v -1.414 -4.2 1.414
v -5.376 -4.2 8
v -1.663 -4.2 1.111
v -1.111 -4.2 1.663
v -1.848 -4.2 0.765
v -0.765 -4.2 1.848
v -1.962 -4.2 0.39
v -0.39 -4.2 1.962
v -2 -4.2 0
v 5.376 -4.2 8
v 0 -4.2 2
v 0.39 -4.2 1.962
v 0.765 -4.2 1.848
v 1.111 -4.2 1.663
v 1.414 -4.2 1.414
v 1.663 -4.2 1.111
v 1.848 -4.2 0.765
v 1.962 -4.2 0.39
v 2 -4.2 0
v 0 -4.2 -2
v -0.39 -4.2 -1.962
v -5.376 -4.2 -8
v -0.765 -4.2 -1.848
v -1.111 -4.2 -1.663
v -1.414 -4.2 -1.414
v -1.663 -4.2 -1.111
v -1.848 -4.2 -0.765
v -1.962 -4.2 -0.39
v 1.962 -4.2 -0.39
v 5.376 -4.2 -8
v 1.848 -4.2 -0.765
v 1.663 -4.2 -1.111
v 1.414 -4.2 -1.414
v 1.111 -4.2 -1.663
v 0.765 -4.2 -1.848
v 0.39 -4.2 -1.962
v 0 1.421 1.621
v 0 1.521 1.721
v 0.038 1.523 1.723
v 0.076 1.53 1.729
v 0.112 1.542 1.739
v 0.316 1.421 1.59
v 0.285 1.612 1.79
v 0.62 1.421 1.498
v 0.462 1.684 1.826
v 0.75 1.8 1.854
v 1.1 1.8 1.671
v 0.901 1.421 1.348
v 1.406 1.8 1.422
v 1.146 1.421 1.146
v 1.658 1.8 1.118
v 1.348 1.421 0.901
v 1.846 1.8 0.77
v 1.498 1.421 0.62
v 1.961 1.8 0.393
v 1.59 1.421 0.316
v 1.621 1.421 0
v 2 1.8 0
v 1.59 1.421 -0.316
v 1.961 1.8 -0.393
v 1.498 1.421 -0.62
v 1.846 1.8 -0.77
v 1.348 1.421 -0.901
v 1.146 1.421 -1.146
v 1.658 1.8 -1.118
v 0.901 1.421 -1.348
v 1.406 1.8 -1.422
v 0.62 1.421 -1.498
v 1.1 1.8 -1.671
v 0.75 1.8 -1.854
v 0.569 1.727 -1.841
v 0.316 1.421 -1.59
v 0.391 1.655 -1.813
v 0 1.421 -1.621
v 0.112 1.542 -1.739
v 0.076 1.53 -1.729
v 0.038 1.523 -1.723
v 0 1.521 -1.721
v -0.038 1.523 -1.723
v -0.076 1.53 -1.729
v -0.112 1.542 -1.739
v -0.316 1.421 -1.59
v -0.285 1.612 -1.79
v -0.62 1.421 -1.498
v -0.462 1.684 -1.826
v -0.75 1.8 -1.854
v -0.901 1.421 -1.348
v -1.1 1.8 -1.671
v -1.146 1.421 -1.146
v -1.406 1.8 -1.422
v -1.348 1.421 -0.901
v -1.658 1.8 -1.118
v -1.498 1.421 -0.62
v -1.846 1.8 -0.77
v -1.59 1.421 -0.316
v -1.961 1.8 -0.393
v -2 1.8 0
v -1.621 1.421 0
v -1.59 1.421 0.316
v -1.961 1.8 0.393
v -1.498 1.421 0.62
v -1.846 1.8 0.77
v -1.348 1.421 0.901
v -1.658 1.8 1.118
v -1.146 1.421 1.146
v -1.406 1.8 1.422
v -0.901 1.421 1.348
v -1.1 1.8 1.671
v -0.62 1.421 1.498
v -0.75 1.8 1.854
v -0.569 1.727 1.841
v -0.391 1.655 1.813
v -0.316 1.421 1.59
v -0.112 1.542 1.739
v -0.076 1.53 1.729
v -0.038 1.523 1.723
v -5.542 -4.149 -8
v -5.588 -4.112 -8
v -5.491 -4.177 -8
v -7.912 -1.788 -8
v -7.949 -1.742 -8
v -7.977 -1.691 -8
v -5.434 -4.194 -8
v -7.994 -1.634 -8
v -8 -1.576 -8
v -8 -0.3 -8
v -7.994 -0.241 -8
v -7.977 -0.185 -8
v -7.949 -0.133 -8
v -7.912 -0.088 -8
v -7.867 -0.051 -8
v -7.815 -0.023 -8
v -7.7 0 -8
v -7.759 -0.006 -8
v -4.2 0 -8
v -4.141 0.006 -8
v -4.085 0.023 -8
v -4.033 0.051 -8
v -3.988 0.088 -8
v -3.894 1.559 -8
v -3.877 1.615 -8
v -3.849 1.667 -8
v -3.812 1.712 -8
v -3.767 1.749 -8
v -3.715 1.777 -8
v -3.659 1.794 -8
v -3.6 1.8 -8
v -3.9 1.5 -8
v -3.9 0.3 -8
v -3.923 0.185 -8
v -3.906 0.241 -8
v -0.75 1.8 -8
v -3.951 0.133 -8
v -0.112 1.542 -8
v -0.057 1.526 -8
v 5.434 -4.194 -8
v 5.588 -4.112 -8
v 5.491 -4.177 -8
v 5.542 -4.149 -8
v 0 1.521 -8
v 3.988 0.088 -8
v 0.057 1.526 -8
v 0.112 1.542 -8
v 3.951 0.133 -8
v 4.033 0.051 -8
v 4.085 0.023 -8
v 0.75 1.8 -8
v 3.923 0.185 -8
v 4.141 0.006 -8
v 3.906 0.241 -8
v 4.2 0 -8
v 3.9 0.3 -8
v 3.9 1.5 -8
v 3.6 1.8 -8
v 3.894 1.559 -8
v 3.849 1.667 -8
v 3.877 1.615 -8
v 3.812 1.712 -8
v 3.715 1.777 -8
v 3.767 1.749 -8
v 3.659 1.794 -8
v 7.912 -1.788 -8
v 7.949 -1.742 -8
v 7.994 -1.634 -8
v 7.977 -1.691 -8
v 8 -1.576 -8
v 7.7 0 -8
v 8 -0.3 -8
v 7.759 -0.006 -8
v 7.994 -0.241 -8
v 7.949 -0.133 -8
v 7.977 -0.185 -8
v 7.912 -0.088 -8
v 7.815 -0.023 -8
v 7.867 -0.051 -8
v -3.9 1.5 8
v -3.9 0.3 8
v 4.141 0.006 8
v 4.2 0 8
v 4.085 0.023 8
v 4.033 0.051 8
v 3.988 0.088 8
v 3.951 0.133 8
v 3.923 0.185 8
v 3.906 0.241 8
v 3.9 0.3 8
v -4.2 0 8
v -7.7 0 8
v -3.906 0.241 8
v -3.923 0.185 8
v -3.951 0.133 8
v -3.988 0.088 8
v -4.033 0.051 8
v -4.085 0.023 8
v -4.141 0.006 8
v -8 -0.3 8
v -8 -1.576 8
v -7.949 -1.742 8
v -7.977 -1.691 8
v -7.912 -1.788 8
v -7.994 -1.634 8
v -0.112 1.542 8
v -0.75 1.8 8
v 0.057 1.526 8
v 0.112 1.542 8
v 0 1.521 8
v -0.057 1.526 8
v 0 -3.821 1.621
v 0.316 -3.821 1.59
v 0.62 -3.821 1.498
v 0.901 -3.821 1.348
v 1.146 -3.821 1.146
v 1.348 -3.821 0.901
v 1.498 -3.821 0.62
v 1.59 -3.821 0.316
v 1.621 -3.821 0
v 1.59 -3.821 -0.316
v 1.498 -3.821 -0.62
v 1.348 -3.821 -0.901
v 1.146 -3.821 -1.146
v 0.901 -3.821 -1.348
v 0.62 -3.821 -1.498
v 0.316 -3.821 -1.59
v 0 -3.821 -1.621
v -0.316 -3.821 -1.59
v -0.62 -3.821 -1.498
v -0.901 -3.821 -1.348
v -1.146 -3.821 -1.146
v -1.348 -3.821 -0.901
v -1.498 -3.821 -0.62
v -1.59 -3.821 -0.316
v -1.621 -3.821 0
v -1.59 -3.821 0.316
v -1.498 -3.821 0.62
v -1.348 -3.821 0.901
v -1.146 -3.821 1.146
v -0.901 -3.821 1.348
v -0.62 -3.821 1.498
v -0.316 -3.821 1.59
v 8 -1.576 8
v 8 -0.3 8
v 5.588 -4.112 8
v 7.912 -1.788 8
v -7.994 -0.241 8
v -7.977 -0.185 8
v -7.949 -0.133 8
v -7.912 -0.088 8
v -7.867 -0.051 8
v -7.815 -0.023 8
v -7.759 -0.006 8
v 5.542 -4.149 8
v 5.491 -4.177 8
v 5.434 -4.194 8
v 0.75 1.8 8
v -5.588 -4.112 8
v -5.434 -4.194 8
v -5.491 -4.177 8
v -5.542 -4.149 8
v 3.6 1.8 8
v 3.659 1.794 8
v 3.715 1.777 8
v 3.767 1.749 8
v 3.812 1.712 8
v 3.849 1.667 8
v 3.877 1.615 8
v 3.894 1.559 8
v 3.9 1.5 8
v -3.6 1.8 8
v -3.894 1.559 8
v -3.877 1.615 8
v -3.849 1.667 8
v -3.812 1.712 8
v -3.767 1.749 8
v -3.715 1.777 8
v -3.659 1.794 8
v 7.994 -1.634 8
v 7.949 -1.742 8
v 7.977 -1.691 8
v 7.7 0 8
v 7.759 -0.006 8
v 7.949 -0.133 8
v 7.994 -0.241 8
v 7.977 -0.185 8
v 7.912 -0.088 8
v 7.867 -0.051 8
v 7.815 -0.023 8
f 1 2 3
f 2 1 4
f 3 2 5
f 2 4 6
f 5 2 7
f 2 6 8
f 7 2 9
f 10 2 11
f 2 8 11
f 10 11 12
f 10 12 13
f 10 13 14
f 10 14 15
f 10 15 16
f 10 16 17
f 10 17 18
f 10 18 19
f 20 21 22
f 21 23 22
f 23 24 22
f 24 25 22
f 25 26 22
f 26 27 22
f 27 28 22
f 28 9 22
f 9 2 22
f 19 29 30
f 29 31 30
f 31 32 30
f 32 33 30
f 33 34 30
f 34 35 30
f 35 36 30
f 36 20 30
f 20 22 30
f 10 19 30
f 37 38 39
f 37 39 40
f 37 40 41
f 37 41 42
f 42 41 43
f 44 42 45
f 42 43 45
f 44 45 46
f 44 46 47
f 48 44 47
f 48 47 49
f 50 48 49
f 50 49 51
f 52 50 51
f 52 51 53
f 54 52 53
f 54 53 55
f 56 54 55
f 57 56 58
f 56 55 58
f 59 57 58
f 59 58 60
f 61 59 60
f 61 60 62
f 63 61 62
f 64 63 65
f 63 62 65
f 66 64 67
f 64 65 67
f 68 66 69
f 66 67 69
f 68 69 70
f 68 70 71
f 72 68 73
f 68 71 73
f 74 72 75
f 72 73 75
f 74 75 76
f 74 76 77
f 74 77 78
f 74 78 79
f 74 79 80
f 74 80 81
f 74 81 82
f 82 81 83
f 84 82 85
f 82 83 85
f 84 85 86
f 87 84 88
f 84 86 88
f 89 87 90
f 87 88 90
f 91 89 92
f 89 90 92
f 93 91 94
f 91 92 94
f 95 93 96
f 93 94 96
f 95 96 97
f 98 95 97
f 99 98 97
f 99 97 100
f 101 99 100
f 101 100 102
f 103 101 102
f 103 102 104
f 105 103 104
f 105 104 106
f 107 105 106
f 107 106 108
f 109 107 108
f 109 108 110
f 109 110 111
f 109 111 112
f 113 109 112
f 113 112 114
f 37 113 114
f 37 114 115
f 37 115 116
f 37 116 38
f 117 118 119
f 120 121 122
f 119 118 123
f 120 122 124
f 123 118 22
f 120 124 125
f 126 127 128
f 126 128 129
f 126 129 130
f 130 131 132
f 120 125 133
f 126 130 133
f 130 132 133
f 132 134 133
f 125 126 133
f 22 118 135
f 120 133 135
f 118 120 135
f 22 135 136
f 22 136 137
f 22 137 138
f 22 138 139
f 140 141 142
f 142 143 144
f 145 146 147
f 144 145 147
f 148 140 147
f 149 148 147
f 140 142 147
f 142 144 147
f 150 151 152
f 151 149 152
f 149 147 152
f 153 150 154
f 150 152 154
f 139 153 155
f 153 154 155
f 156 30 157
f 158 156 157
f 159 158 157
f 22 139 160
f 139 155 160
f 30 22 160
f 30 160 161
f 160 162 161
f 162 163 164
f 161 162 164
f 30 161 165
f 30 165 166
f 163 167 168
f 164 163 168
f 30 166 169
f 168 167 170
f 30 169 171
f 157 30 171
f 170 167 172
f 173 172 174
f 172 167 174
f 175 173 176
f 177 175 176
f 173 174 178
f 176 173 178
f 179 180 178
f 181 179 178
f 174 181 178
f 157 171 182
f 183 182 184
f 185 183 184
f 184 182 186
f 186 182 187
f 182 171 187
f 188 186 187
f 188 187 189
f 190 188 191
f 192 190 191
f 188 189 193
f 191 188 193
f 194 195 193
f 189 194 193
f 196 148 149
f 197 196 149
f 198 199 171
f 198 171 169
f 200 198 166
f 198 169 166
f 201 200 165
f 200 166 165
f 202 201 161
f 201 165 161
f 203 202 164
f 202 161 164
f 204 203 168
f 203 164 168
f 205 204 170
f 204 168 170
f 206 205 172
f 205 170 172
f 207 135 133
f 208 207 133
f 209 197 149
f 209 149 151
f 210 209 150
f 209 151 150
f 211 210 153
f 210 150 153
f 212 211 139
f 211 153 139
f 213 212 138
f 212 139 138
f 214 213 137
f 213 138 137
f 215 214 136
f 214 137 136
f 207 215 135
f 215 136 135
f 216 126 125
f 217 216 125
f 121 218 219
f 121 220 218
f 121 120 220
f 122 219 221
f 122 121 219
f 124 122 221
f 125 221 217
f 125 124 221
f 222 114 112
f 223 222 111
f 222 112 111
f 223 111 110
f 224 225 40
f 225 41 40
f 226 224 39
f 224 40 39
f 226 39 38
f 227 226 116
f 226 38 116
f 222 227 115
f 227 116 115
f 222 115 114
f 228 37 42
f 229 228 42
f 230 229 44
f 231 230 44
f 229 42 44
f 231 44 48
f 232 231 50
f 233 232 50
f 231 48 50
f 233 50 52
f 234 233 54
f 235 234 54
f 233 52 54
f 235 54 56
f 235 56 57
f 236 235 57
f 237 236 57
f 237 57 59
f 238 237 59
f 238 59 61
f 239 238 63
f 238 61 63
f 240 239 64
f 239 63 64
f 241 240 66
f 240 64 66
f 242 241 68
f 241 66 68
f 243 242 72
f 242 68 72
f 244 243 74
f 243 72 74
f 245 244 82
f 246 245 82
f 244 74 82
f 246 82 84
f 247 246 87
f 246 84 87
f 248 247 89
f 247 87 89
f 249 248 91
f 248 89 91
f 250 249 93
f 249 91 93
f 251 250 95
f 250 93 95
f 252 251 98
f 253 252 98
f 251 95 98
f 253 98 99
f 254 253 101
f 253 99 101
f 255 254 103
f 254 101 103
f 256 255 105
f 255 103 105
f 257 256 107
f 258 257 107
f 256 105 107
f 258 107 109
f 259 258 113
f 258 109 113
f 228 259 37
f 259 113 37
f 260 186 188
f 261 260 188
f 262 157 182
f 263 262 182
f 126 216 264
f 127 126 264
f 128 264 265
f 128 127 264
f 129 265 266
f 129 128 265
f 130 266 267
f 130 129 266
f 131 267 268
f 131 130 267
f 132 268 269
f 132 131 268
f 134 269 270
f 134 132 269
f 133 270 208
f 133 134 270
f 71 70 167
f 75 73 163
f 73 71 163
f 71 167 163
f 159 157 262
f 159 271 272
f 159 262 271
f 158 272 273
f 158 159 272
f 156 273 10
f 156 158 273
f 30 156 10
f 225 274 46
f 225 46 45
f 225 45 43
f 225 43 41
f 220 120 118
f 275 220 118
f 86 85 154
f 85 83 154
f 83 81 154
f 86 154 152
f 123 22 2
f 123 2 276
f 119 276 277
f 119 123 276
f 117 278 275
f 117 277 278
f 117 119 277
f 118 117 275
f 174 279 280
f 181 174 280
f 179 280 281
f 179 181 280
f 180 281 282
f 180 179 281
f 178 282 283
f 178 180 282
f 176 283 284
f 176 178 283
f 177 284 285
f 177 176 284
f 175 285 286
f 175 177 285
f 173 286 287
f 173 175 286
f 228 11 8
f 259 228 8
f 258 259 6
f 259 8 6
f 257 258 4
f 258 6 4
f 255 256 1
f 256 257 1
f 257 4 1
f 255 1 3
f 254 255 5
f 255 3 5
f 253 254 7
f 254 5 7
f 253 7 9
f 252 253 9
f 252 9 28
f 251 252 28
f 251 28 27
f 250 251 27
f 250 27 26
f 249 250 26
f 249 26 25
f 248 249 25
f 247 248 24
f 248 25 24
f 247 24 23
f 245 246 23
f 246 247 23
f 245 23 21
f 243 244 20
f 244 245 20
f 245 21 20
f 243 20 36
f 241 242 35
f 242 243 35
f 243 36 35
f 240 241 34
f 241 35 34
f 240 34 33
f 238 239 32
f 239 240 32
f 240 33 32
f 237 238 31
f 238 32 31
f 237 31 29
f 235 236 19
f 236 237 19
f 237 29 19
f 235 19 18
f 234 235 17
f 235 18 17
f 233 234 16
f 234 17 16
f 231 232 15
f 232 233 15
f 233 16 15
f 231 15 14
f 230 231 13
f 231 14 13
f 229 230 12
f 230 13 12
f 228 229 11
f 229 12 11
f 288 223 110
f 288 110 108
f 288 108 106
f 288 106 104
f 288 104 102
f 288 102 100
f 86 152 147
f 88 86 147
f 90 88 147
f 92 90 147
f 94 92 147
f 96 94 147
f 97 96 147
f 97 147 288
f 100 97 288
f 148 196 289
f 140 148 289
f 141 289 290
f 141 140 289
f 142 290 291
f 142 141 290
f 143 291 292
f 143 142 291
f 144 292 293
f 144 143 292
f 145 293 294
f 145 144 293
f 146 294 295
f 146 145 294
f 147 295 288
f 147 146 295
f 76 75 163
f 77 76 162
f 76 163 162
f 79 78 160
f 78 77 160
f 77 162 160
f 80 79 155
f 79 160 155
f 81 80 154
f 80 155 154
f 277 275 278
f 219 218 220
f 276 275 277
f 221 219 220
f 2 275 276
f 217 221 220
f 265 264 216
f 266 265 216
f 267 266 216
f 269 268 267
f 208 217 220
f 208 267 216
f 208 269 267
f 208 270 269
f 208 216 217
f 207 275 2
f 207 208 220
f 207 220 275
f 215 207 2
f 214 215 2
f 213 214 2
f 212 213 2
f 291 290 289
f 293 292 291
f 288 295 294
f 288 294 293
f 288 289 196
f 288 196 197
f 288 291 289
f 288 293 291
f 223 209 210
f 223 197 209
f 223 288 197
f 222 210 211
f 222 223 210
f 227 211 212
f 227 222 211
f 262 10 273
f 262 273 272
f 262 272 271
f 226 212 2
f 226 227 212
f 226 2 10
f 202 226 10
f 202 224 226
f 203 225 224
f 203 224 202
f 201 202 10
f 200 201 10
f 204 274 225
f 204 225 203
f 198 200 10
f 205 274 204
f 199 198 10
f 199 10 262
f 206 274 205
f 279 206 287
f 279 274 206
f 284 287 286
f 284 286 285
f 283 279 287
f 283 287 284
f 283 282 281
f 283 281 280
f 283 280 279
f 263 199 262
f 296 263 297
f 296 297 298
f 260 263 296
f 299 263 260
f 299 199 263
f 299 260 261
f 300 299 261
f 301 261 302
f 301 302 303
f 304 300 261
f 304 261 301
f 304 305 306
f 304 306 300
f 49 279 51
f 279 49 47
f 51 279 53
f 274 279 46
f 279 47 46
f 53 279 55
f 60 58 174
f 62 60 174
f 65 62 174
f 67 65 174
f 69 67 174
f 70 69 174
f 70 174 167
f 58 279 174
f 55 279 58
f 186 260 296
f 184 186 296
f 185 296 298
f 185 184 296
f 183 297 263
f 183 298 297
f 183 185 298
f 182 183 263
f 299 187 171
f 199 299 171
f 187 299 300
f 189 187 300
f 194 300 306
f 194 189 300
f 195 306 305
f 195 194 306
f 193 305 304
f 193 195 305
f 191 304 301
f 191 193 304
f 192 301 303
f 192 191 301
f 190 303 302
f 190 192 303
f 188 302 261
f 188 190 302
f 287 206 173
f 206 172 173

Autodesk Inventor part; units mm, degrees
ref_plane "YZ Plane" through (0, 0, 0) normal (1, 0, 0) x (0, 1, 0)
ref_plane "XZ Plane" through (0, 0, 0) normal (0, 1, 0) x (-1, 0, 0)
ref_plane "XY Plane" through (0, 0, 0) normal (0, 0, 1) x (1, 0, 0)
sketch "Sketch_1" plane through (0, 0, 0) normal (0, 0, 1) x (1, 0, 0)
  arc A0 (-8, -1.5757) -> (-7.9121, -1.7879) centre (-7.7, -1.5757) ccw
  line L0 (-7.9121, -1.7879) -> (-5.5879, -4.1121)
  arc A1 (-5.5879, -4.1121) -> (-5.3757, -4.2) centre (-5.3757, -3.9) ccw
  line L1 (-5.3757, -4.2) -> (5.3757, -4.2)
  arc A2 (5.3757, -4.2) -> (5.5879, -4.1121) centre (5.3757, -3.9) ccw
  line L2 (5.5879, -4.1121) -> (7.9121, -1.7879)
  arc A3 (7.9121, -1.7879) -> (8, -1.5757) centre (7.7, -1.5757) ccw
  line L3 (8, -1.5757) -> (8, -0.3)
  arc A4 (8, -0.3) -> (7.7, 0) centre (7.7, -0.3) ccw
  line L4 (7.7, 0) -> (4.2, 0)
  arc A5 (3.9, 0.3) -> (4.2, 0) centre (4.2, 0.3) ccw
  line L5 (3.9, 0.3) -> (3.9, 1.5)
  arc A6 (3.9, 1.5) -> (3.6, 1.8) centre (3.6, 1.5) ccw
  line L6 (3.6, 1.8) -> (0.75, 1.8)
  line L7 (0.75, 1.8) -> (0.1124, 1.5424)
  arc A7 (-0.1124, 1.5424) -> (0.1124, 1.5424) centre (0, 1.8205) ccw
  line L8 (-0.1124, 1.5424) -> (-0.75, 1.8)
  line L9 (-0.75, 1.8) -> (-3.6, 1.8)
  arc A8 (-3.6, 1.8) -> (-3.9, 1.5) centre (-3.6, 1.5) ccw
  line L10 (-3.9, 1.5) -> (-3.9, 0.3)
  arc A9 (-4.2, 0) -> (-3.9, 0.3) centre (-4.2, 0.3) ccw
  line L11 (-4.2, 0) -> (-7.7, 0)
  arc A10 (-7.7, 0) -> (-8, -0.3) centre (-7.7, -0.3) ccw
  line L12 (-8, -0.3) -> (-8, -1.5757)
extrude "Extrusion1" add sketch "Sketch_1" along normal mid plane 16
sketch "Sketch_2" plane through (0, 0, 0) normal (1, 0, 0) x (0, 1, 0)
  line L0 (1.8, 0) -> (-4.2, 0)
  line L1 (-4.2, 0) -> (-4.2, 2)
  line L2 (-4.2, 2) -> (-3.821, 1.621)
  line L3 (-3.821, 1.621) -> (1.421, 1.621)
  line L4 (1.421, 1.621) -> (1.8, 2)
  line L5 (1.8, 2) -> (1.8, 0)
  line L6 (1.8, 0) -> (-4.2, 0)
revolve "Revolution1" cut sketch "Sketch_2" angle 360 about axis through (0, 1.8, 0) along (0, 1, 0)
thread "Thread1" size "M4x0.7" class "6H" standard "ISO Metric profile" full length
properties part number "13022_m"
